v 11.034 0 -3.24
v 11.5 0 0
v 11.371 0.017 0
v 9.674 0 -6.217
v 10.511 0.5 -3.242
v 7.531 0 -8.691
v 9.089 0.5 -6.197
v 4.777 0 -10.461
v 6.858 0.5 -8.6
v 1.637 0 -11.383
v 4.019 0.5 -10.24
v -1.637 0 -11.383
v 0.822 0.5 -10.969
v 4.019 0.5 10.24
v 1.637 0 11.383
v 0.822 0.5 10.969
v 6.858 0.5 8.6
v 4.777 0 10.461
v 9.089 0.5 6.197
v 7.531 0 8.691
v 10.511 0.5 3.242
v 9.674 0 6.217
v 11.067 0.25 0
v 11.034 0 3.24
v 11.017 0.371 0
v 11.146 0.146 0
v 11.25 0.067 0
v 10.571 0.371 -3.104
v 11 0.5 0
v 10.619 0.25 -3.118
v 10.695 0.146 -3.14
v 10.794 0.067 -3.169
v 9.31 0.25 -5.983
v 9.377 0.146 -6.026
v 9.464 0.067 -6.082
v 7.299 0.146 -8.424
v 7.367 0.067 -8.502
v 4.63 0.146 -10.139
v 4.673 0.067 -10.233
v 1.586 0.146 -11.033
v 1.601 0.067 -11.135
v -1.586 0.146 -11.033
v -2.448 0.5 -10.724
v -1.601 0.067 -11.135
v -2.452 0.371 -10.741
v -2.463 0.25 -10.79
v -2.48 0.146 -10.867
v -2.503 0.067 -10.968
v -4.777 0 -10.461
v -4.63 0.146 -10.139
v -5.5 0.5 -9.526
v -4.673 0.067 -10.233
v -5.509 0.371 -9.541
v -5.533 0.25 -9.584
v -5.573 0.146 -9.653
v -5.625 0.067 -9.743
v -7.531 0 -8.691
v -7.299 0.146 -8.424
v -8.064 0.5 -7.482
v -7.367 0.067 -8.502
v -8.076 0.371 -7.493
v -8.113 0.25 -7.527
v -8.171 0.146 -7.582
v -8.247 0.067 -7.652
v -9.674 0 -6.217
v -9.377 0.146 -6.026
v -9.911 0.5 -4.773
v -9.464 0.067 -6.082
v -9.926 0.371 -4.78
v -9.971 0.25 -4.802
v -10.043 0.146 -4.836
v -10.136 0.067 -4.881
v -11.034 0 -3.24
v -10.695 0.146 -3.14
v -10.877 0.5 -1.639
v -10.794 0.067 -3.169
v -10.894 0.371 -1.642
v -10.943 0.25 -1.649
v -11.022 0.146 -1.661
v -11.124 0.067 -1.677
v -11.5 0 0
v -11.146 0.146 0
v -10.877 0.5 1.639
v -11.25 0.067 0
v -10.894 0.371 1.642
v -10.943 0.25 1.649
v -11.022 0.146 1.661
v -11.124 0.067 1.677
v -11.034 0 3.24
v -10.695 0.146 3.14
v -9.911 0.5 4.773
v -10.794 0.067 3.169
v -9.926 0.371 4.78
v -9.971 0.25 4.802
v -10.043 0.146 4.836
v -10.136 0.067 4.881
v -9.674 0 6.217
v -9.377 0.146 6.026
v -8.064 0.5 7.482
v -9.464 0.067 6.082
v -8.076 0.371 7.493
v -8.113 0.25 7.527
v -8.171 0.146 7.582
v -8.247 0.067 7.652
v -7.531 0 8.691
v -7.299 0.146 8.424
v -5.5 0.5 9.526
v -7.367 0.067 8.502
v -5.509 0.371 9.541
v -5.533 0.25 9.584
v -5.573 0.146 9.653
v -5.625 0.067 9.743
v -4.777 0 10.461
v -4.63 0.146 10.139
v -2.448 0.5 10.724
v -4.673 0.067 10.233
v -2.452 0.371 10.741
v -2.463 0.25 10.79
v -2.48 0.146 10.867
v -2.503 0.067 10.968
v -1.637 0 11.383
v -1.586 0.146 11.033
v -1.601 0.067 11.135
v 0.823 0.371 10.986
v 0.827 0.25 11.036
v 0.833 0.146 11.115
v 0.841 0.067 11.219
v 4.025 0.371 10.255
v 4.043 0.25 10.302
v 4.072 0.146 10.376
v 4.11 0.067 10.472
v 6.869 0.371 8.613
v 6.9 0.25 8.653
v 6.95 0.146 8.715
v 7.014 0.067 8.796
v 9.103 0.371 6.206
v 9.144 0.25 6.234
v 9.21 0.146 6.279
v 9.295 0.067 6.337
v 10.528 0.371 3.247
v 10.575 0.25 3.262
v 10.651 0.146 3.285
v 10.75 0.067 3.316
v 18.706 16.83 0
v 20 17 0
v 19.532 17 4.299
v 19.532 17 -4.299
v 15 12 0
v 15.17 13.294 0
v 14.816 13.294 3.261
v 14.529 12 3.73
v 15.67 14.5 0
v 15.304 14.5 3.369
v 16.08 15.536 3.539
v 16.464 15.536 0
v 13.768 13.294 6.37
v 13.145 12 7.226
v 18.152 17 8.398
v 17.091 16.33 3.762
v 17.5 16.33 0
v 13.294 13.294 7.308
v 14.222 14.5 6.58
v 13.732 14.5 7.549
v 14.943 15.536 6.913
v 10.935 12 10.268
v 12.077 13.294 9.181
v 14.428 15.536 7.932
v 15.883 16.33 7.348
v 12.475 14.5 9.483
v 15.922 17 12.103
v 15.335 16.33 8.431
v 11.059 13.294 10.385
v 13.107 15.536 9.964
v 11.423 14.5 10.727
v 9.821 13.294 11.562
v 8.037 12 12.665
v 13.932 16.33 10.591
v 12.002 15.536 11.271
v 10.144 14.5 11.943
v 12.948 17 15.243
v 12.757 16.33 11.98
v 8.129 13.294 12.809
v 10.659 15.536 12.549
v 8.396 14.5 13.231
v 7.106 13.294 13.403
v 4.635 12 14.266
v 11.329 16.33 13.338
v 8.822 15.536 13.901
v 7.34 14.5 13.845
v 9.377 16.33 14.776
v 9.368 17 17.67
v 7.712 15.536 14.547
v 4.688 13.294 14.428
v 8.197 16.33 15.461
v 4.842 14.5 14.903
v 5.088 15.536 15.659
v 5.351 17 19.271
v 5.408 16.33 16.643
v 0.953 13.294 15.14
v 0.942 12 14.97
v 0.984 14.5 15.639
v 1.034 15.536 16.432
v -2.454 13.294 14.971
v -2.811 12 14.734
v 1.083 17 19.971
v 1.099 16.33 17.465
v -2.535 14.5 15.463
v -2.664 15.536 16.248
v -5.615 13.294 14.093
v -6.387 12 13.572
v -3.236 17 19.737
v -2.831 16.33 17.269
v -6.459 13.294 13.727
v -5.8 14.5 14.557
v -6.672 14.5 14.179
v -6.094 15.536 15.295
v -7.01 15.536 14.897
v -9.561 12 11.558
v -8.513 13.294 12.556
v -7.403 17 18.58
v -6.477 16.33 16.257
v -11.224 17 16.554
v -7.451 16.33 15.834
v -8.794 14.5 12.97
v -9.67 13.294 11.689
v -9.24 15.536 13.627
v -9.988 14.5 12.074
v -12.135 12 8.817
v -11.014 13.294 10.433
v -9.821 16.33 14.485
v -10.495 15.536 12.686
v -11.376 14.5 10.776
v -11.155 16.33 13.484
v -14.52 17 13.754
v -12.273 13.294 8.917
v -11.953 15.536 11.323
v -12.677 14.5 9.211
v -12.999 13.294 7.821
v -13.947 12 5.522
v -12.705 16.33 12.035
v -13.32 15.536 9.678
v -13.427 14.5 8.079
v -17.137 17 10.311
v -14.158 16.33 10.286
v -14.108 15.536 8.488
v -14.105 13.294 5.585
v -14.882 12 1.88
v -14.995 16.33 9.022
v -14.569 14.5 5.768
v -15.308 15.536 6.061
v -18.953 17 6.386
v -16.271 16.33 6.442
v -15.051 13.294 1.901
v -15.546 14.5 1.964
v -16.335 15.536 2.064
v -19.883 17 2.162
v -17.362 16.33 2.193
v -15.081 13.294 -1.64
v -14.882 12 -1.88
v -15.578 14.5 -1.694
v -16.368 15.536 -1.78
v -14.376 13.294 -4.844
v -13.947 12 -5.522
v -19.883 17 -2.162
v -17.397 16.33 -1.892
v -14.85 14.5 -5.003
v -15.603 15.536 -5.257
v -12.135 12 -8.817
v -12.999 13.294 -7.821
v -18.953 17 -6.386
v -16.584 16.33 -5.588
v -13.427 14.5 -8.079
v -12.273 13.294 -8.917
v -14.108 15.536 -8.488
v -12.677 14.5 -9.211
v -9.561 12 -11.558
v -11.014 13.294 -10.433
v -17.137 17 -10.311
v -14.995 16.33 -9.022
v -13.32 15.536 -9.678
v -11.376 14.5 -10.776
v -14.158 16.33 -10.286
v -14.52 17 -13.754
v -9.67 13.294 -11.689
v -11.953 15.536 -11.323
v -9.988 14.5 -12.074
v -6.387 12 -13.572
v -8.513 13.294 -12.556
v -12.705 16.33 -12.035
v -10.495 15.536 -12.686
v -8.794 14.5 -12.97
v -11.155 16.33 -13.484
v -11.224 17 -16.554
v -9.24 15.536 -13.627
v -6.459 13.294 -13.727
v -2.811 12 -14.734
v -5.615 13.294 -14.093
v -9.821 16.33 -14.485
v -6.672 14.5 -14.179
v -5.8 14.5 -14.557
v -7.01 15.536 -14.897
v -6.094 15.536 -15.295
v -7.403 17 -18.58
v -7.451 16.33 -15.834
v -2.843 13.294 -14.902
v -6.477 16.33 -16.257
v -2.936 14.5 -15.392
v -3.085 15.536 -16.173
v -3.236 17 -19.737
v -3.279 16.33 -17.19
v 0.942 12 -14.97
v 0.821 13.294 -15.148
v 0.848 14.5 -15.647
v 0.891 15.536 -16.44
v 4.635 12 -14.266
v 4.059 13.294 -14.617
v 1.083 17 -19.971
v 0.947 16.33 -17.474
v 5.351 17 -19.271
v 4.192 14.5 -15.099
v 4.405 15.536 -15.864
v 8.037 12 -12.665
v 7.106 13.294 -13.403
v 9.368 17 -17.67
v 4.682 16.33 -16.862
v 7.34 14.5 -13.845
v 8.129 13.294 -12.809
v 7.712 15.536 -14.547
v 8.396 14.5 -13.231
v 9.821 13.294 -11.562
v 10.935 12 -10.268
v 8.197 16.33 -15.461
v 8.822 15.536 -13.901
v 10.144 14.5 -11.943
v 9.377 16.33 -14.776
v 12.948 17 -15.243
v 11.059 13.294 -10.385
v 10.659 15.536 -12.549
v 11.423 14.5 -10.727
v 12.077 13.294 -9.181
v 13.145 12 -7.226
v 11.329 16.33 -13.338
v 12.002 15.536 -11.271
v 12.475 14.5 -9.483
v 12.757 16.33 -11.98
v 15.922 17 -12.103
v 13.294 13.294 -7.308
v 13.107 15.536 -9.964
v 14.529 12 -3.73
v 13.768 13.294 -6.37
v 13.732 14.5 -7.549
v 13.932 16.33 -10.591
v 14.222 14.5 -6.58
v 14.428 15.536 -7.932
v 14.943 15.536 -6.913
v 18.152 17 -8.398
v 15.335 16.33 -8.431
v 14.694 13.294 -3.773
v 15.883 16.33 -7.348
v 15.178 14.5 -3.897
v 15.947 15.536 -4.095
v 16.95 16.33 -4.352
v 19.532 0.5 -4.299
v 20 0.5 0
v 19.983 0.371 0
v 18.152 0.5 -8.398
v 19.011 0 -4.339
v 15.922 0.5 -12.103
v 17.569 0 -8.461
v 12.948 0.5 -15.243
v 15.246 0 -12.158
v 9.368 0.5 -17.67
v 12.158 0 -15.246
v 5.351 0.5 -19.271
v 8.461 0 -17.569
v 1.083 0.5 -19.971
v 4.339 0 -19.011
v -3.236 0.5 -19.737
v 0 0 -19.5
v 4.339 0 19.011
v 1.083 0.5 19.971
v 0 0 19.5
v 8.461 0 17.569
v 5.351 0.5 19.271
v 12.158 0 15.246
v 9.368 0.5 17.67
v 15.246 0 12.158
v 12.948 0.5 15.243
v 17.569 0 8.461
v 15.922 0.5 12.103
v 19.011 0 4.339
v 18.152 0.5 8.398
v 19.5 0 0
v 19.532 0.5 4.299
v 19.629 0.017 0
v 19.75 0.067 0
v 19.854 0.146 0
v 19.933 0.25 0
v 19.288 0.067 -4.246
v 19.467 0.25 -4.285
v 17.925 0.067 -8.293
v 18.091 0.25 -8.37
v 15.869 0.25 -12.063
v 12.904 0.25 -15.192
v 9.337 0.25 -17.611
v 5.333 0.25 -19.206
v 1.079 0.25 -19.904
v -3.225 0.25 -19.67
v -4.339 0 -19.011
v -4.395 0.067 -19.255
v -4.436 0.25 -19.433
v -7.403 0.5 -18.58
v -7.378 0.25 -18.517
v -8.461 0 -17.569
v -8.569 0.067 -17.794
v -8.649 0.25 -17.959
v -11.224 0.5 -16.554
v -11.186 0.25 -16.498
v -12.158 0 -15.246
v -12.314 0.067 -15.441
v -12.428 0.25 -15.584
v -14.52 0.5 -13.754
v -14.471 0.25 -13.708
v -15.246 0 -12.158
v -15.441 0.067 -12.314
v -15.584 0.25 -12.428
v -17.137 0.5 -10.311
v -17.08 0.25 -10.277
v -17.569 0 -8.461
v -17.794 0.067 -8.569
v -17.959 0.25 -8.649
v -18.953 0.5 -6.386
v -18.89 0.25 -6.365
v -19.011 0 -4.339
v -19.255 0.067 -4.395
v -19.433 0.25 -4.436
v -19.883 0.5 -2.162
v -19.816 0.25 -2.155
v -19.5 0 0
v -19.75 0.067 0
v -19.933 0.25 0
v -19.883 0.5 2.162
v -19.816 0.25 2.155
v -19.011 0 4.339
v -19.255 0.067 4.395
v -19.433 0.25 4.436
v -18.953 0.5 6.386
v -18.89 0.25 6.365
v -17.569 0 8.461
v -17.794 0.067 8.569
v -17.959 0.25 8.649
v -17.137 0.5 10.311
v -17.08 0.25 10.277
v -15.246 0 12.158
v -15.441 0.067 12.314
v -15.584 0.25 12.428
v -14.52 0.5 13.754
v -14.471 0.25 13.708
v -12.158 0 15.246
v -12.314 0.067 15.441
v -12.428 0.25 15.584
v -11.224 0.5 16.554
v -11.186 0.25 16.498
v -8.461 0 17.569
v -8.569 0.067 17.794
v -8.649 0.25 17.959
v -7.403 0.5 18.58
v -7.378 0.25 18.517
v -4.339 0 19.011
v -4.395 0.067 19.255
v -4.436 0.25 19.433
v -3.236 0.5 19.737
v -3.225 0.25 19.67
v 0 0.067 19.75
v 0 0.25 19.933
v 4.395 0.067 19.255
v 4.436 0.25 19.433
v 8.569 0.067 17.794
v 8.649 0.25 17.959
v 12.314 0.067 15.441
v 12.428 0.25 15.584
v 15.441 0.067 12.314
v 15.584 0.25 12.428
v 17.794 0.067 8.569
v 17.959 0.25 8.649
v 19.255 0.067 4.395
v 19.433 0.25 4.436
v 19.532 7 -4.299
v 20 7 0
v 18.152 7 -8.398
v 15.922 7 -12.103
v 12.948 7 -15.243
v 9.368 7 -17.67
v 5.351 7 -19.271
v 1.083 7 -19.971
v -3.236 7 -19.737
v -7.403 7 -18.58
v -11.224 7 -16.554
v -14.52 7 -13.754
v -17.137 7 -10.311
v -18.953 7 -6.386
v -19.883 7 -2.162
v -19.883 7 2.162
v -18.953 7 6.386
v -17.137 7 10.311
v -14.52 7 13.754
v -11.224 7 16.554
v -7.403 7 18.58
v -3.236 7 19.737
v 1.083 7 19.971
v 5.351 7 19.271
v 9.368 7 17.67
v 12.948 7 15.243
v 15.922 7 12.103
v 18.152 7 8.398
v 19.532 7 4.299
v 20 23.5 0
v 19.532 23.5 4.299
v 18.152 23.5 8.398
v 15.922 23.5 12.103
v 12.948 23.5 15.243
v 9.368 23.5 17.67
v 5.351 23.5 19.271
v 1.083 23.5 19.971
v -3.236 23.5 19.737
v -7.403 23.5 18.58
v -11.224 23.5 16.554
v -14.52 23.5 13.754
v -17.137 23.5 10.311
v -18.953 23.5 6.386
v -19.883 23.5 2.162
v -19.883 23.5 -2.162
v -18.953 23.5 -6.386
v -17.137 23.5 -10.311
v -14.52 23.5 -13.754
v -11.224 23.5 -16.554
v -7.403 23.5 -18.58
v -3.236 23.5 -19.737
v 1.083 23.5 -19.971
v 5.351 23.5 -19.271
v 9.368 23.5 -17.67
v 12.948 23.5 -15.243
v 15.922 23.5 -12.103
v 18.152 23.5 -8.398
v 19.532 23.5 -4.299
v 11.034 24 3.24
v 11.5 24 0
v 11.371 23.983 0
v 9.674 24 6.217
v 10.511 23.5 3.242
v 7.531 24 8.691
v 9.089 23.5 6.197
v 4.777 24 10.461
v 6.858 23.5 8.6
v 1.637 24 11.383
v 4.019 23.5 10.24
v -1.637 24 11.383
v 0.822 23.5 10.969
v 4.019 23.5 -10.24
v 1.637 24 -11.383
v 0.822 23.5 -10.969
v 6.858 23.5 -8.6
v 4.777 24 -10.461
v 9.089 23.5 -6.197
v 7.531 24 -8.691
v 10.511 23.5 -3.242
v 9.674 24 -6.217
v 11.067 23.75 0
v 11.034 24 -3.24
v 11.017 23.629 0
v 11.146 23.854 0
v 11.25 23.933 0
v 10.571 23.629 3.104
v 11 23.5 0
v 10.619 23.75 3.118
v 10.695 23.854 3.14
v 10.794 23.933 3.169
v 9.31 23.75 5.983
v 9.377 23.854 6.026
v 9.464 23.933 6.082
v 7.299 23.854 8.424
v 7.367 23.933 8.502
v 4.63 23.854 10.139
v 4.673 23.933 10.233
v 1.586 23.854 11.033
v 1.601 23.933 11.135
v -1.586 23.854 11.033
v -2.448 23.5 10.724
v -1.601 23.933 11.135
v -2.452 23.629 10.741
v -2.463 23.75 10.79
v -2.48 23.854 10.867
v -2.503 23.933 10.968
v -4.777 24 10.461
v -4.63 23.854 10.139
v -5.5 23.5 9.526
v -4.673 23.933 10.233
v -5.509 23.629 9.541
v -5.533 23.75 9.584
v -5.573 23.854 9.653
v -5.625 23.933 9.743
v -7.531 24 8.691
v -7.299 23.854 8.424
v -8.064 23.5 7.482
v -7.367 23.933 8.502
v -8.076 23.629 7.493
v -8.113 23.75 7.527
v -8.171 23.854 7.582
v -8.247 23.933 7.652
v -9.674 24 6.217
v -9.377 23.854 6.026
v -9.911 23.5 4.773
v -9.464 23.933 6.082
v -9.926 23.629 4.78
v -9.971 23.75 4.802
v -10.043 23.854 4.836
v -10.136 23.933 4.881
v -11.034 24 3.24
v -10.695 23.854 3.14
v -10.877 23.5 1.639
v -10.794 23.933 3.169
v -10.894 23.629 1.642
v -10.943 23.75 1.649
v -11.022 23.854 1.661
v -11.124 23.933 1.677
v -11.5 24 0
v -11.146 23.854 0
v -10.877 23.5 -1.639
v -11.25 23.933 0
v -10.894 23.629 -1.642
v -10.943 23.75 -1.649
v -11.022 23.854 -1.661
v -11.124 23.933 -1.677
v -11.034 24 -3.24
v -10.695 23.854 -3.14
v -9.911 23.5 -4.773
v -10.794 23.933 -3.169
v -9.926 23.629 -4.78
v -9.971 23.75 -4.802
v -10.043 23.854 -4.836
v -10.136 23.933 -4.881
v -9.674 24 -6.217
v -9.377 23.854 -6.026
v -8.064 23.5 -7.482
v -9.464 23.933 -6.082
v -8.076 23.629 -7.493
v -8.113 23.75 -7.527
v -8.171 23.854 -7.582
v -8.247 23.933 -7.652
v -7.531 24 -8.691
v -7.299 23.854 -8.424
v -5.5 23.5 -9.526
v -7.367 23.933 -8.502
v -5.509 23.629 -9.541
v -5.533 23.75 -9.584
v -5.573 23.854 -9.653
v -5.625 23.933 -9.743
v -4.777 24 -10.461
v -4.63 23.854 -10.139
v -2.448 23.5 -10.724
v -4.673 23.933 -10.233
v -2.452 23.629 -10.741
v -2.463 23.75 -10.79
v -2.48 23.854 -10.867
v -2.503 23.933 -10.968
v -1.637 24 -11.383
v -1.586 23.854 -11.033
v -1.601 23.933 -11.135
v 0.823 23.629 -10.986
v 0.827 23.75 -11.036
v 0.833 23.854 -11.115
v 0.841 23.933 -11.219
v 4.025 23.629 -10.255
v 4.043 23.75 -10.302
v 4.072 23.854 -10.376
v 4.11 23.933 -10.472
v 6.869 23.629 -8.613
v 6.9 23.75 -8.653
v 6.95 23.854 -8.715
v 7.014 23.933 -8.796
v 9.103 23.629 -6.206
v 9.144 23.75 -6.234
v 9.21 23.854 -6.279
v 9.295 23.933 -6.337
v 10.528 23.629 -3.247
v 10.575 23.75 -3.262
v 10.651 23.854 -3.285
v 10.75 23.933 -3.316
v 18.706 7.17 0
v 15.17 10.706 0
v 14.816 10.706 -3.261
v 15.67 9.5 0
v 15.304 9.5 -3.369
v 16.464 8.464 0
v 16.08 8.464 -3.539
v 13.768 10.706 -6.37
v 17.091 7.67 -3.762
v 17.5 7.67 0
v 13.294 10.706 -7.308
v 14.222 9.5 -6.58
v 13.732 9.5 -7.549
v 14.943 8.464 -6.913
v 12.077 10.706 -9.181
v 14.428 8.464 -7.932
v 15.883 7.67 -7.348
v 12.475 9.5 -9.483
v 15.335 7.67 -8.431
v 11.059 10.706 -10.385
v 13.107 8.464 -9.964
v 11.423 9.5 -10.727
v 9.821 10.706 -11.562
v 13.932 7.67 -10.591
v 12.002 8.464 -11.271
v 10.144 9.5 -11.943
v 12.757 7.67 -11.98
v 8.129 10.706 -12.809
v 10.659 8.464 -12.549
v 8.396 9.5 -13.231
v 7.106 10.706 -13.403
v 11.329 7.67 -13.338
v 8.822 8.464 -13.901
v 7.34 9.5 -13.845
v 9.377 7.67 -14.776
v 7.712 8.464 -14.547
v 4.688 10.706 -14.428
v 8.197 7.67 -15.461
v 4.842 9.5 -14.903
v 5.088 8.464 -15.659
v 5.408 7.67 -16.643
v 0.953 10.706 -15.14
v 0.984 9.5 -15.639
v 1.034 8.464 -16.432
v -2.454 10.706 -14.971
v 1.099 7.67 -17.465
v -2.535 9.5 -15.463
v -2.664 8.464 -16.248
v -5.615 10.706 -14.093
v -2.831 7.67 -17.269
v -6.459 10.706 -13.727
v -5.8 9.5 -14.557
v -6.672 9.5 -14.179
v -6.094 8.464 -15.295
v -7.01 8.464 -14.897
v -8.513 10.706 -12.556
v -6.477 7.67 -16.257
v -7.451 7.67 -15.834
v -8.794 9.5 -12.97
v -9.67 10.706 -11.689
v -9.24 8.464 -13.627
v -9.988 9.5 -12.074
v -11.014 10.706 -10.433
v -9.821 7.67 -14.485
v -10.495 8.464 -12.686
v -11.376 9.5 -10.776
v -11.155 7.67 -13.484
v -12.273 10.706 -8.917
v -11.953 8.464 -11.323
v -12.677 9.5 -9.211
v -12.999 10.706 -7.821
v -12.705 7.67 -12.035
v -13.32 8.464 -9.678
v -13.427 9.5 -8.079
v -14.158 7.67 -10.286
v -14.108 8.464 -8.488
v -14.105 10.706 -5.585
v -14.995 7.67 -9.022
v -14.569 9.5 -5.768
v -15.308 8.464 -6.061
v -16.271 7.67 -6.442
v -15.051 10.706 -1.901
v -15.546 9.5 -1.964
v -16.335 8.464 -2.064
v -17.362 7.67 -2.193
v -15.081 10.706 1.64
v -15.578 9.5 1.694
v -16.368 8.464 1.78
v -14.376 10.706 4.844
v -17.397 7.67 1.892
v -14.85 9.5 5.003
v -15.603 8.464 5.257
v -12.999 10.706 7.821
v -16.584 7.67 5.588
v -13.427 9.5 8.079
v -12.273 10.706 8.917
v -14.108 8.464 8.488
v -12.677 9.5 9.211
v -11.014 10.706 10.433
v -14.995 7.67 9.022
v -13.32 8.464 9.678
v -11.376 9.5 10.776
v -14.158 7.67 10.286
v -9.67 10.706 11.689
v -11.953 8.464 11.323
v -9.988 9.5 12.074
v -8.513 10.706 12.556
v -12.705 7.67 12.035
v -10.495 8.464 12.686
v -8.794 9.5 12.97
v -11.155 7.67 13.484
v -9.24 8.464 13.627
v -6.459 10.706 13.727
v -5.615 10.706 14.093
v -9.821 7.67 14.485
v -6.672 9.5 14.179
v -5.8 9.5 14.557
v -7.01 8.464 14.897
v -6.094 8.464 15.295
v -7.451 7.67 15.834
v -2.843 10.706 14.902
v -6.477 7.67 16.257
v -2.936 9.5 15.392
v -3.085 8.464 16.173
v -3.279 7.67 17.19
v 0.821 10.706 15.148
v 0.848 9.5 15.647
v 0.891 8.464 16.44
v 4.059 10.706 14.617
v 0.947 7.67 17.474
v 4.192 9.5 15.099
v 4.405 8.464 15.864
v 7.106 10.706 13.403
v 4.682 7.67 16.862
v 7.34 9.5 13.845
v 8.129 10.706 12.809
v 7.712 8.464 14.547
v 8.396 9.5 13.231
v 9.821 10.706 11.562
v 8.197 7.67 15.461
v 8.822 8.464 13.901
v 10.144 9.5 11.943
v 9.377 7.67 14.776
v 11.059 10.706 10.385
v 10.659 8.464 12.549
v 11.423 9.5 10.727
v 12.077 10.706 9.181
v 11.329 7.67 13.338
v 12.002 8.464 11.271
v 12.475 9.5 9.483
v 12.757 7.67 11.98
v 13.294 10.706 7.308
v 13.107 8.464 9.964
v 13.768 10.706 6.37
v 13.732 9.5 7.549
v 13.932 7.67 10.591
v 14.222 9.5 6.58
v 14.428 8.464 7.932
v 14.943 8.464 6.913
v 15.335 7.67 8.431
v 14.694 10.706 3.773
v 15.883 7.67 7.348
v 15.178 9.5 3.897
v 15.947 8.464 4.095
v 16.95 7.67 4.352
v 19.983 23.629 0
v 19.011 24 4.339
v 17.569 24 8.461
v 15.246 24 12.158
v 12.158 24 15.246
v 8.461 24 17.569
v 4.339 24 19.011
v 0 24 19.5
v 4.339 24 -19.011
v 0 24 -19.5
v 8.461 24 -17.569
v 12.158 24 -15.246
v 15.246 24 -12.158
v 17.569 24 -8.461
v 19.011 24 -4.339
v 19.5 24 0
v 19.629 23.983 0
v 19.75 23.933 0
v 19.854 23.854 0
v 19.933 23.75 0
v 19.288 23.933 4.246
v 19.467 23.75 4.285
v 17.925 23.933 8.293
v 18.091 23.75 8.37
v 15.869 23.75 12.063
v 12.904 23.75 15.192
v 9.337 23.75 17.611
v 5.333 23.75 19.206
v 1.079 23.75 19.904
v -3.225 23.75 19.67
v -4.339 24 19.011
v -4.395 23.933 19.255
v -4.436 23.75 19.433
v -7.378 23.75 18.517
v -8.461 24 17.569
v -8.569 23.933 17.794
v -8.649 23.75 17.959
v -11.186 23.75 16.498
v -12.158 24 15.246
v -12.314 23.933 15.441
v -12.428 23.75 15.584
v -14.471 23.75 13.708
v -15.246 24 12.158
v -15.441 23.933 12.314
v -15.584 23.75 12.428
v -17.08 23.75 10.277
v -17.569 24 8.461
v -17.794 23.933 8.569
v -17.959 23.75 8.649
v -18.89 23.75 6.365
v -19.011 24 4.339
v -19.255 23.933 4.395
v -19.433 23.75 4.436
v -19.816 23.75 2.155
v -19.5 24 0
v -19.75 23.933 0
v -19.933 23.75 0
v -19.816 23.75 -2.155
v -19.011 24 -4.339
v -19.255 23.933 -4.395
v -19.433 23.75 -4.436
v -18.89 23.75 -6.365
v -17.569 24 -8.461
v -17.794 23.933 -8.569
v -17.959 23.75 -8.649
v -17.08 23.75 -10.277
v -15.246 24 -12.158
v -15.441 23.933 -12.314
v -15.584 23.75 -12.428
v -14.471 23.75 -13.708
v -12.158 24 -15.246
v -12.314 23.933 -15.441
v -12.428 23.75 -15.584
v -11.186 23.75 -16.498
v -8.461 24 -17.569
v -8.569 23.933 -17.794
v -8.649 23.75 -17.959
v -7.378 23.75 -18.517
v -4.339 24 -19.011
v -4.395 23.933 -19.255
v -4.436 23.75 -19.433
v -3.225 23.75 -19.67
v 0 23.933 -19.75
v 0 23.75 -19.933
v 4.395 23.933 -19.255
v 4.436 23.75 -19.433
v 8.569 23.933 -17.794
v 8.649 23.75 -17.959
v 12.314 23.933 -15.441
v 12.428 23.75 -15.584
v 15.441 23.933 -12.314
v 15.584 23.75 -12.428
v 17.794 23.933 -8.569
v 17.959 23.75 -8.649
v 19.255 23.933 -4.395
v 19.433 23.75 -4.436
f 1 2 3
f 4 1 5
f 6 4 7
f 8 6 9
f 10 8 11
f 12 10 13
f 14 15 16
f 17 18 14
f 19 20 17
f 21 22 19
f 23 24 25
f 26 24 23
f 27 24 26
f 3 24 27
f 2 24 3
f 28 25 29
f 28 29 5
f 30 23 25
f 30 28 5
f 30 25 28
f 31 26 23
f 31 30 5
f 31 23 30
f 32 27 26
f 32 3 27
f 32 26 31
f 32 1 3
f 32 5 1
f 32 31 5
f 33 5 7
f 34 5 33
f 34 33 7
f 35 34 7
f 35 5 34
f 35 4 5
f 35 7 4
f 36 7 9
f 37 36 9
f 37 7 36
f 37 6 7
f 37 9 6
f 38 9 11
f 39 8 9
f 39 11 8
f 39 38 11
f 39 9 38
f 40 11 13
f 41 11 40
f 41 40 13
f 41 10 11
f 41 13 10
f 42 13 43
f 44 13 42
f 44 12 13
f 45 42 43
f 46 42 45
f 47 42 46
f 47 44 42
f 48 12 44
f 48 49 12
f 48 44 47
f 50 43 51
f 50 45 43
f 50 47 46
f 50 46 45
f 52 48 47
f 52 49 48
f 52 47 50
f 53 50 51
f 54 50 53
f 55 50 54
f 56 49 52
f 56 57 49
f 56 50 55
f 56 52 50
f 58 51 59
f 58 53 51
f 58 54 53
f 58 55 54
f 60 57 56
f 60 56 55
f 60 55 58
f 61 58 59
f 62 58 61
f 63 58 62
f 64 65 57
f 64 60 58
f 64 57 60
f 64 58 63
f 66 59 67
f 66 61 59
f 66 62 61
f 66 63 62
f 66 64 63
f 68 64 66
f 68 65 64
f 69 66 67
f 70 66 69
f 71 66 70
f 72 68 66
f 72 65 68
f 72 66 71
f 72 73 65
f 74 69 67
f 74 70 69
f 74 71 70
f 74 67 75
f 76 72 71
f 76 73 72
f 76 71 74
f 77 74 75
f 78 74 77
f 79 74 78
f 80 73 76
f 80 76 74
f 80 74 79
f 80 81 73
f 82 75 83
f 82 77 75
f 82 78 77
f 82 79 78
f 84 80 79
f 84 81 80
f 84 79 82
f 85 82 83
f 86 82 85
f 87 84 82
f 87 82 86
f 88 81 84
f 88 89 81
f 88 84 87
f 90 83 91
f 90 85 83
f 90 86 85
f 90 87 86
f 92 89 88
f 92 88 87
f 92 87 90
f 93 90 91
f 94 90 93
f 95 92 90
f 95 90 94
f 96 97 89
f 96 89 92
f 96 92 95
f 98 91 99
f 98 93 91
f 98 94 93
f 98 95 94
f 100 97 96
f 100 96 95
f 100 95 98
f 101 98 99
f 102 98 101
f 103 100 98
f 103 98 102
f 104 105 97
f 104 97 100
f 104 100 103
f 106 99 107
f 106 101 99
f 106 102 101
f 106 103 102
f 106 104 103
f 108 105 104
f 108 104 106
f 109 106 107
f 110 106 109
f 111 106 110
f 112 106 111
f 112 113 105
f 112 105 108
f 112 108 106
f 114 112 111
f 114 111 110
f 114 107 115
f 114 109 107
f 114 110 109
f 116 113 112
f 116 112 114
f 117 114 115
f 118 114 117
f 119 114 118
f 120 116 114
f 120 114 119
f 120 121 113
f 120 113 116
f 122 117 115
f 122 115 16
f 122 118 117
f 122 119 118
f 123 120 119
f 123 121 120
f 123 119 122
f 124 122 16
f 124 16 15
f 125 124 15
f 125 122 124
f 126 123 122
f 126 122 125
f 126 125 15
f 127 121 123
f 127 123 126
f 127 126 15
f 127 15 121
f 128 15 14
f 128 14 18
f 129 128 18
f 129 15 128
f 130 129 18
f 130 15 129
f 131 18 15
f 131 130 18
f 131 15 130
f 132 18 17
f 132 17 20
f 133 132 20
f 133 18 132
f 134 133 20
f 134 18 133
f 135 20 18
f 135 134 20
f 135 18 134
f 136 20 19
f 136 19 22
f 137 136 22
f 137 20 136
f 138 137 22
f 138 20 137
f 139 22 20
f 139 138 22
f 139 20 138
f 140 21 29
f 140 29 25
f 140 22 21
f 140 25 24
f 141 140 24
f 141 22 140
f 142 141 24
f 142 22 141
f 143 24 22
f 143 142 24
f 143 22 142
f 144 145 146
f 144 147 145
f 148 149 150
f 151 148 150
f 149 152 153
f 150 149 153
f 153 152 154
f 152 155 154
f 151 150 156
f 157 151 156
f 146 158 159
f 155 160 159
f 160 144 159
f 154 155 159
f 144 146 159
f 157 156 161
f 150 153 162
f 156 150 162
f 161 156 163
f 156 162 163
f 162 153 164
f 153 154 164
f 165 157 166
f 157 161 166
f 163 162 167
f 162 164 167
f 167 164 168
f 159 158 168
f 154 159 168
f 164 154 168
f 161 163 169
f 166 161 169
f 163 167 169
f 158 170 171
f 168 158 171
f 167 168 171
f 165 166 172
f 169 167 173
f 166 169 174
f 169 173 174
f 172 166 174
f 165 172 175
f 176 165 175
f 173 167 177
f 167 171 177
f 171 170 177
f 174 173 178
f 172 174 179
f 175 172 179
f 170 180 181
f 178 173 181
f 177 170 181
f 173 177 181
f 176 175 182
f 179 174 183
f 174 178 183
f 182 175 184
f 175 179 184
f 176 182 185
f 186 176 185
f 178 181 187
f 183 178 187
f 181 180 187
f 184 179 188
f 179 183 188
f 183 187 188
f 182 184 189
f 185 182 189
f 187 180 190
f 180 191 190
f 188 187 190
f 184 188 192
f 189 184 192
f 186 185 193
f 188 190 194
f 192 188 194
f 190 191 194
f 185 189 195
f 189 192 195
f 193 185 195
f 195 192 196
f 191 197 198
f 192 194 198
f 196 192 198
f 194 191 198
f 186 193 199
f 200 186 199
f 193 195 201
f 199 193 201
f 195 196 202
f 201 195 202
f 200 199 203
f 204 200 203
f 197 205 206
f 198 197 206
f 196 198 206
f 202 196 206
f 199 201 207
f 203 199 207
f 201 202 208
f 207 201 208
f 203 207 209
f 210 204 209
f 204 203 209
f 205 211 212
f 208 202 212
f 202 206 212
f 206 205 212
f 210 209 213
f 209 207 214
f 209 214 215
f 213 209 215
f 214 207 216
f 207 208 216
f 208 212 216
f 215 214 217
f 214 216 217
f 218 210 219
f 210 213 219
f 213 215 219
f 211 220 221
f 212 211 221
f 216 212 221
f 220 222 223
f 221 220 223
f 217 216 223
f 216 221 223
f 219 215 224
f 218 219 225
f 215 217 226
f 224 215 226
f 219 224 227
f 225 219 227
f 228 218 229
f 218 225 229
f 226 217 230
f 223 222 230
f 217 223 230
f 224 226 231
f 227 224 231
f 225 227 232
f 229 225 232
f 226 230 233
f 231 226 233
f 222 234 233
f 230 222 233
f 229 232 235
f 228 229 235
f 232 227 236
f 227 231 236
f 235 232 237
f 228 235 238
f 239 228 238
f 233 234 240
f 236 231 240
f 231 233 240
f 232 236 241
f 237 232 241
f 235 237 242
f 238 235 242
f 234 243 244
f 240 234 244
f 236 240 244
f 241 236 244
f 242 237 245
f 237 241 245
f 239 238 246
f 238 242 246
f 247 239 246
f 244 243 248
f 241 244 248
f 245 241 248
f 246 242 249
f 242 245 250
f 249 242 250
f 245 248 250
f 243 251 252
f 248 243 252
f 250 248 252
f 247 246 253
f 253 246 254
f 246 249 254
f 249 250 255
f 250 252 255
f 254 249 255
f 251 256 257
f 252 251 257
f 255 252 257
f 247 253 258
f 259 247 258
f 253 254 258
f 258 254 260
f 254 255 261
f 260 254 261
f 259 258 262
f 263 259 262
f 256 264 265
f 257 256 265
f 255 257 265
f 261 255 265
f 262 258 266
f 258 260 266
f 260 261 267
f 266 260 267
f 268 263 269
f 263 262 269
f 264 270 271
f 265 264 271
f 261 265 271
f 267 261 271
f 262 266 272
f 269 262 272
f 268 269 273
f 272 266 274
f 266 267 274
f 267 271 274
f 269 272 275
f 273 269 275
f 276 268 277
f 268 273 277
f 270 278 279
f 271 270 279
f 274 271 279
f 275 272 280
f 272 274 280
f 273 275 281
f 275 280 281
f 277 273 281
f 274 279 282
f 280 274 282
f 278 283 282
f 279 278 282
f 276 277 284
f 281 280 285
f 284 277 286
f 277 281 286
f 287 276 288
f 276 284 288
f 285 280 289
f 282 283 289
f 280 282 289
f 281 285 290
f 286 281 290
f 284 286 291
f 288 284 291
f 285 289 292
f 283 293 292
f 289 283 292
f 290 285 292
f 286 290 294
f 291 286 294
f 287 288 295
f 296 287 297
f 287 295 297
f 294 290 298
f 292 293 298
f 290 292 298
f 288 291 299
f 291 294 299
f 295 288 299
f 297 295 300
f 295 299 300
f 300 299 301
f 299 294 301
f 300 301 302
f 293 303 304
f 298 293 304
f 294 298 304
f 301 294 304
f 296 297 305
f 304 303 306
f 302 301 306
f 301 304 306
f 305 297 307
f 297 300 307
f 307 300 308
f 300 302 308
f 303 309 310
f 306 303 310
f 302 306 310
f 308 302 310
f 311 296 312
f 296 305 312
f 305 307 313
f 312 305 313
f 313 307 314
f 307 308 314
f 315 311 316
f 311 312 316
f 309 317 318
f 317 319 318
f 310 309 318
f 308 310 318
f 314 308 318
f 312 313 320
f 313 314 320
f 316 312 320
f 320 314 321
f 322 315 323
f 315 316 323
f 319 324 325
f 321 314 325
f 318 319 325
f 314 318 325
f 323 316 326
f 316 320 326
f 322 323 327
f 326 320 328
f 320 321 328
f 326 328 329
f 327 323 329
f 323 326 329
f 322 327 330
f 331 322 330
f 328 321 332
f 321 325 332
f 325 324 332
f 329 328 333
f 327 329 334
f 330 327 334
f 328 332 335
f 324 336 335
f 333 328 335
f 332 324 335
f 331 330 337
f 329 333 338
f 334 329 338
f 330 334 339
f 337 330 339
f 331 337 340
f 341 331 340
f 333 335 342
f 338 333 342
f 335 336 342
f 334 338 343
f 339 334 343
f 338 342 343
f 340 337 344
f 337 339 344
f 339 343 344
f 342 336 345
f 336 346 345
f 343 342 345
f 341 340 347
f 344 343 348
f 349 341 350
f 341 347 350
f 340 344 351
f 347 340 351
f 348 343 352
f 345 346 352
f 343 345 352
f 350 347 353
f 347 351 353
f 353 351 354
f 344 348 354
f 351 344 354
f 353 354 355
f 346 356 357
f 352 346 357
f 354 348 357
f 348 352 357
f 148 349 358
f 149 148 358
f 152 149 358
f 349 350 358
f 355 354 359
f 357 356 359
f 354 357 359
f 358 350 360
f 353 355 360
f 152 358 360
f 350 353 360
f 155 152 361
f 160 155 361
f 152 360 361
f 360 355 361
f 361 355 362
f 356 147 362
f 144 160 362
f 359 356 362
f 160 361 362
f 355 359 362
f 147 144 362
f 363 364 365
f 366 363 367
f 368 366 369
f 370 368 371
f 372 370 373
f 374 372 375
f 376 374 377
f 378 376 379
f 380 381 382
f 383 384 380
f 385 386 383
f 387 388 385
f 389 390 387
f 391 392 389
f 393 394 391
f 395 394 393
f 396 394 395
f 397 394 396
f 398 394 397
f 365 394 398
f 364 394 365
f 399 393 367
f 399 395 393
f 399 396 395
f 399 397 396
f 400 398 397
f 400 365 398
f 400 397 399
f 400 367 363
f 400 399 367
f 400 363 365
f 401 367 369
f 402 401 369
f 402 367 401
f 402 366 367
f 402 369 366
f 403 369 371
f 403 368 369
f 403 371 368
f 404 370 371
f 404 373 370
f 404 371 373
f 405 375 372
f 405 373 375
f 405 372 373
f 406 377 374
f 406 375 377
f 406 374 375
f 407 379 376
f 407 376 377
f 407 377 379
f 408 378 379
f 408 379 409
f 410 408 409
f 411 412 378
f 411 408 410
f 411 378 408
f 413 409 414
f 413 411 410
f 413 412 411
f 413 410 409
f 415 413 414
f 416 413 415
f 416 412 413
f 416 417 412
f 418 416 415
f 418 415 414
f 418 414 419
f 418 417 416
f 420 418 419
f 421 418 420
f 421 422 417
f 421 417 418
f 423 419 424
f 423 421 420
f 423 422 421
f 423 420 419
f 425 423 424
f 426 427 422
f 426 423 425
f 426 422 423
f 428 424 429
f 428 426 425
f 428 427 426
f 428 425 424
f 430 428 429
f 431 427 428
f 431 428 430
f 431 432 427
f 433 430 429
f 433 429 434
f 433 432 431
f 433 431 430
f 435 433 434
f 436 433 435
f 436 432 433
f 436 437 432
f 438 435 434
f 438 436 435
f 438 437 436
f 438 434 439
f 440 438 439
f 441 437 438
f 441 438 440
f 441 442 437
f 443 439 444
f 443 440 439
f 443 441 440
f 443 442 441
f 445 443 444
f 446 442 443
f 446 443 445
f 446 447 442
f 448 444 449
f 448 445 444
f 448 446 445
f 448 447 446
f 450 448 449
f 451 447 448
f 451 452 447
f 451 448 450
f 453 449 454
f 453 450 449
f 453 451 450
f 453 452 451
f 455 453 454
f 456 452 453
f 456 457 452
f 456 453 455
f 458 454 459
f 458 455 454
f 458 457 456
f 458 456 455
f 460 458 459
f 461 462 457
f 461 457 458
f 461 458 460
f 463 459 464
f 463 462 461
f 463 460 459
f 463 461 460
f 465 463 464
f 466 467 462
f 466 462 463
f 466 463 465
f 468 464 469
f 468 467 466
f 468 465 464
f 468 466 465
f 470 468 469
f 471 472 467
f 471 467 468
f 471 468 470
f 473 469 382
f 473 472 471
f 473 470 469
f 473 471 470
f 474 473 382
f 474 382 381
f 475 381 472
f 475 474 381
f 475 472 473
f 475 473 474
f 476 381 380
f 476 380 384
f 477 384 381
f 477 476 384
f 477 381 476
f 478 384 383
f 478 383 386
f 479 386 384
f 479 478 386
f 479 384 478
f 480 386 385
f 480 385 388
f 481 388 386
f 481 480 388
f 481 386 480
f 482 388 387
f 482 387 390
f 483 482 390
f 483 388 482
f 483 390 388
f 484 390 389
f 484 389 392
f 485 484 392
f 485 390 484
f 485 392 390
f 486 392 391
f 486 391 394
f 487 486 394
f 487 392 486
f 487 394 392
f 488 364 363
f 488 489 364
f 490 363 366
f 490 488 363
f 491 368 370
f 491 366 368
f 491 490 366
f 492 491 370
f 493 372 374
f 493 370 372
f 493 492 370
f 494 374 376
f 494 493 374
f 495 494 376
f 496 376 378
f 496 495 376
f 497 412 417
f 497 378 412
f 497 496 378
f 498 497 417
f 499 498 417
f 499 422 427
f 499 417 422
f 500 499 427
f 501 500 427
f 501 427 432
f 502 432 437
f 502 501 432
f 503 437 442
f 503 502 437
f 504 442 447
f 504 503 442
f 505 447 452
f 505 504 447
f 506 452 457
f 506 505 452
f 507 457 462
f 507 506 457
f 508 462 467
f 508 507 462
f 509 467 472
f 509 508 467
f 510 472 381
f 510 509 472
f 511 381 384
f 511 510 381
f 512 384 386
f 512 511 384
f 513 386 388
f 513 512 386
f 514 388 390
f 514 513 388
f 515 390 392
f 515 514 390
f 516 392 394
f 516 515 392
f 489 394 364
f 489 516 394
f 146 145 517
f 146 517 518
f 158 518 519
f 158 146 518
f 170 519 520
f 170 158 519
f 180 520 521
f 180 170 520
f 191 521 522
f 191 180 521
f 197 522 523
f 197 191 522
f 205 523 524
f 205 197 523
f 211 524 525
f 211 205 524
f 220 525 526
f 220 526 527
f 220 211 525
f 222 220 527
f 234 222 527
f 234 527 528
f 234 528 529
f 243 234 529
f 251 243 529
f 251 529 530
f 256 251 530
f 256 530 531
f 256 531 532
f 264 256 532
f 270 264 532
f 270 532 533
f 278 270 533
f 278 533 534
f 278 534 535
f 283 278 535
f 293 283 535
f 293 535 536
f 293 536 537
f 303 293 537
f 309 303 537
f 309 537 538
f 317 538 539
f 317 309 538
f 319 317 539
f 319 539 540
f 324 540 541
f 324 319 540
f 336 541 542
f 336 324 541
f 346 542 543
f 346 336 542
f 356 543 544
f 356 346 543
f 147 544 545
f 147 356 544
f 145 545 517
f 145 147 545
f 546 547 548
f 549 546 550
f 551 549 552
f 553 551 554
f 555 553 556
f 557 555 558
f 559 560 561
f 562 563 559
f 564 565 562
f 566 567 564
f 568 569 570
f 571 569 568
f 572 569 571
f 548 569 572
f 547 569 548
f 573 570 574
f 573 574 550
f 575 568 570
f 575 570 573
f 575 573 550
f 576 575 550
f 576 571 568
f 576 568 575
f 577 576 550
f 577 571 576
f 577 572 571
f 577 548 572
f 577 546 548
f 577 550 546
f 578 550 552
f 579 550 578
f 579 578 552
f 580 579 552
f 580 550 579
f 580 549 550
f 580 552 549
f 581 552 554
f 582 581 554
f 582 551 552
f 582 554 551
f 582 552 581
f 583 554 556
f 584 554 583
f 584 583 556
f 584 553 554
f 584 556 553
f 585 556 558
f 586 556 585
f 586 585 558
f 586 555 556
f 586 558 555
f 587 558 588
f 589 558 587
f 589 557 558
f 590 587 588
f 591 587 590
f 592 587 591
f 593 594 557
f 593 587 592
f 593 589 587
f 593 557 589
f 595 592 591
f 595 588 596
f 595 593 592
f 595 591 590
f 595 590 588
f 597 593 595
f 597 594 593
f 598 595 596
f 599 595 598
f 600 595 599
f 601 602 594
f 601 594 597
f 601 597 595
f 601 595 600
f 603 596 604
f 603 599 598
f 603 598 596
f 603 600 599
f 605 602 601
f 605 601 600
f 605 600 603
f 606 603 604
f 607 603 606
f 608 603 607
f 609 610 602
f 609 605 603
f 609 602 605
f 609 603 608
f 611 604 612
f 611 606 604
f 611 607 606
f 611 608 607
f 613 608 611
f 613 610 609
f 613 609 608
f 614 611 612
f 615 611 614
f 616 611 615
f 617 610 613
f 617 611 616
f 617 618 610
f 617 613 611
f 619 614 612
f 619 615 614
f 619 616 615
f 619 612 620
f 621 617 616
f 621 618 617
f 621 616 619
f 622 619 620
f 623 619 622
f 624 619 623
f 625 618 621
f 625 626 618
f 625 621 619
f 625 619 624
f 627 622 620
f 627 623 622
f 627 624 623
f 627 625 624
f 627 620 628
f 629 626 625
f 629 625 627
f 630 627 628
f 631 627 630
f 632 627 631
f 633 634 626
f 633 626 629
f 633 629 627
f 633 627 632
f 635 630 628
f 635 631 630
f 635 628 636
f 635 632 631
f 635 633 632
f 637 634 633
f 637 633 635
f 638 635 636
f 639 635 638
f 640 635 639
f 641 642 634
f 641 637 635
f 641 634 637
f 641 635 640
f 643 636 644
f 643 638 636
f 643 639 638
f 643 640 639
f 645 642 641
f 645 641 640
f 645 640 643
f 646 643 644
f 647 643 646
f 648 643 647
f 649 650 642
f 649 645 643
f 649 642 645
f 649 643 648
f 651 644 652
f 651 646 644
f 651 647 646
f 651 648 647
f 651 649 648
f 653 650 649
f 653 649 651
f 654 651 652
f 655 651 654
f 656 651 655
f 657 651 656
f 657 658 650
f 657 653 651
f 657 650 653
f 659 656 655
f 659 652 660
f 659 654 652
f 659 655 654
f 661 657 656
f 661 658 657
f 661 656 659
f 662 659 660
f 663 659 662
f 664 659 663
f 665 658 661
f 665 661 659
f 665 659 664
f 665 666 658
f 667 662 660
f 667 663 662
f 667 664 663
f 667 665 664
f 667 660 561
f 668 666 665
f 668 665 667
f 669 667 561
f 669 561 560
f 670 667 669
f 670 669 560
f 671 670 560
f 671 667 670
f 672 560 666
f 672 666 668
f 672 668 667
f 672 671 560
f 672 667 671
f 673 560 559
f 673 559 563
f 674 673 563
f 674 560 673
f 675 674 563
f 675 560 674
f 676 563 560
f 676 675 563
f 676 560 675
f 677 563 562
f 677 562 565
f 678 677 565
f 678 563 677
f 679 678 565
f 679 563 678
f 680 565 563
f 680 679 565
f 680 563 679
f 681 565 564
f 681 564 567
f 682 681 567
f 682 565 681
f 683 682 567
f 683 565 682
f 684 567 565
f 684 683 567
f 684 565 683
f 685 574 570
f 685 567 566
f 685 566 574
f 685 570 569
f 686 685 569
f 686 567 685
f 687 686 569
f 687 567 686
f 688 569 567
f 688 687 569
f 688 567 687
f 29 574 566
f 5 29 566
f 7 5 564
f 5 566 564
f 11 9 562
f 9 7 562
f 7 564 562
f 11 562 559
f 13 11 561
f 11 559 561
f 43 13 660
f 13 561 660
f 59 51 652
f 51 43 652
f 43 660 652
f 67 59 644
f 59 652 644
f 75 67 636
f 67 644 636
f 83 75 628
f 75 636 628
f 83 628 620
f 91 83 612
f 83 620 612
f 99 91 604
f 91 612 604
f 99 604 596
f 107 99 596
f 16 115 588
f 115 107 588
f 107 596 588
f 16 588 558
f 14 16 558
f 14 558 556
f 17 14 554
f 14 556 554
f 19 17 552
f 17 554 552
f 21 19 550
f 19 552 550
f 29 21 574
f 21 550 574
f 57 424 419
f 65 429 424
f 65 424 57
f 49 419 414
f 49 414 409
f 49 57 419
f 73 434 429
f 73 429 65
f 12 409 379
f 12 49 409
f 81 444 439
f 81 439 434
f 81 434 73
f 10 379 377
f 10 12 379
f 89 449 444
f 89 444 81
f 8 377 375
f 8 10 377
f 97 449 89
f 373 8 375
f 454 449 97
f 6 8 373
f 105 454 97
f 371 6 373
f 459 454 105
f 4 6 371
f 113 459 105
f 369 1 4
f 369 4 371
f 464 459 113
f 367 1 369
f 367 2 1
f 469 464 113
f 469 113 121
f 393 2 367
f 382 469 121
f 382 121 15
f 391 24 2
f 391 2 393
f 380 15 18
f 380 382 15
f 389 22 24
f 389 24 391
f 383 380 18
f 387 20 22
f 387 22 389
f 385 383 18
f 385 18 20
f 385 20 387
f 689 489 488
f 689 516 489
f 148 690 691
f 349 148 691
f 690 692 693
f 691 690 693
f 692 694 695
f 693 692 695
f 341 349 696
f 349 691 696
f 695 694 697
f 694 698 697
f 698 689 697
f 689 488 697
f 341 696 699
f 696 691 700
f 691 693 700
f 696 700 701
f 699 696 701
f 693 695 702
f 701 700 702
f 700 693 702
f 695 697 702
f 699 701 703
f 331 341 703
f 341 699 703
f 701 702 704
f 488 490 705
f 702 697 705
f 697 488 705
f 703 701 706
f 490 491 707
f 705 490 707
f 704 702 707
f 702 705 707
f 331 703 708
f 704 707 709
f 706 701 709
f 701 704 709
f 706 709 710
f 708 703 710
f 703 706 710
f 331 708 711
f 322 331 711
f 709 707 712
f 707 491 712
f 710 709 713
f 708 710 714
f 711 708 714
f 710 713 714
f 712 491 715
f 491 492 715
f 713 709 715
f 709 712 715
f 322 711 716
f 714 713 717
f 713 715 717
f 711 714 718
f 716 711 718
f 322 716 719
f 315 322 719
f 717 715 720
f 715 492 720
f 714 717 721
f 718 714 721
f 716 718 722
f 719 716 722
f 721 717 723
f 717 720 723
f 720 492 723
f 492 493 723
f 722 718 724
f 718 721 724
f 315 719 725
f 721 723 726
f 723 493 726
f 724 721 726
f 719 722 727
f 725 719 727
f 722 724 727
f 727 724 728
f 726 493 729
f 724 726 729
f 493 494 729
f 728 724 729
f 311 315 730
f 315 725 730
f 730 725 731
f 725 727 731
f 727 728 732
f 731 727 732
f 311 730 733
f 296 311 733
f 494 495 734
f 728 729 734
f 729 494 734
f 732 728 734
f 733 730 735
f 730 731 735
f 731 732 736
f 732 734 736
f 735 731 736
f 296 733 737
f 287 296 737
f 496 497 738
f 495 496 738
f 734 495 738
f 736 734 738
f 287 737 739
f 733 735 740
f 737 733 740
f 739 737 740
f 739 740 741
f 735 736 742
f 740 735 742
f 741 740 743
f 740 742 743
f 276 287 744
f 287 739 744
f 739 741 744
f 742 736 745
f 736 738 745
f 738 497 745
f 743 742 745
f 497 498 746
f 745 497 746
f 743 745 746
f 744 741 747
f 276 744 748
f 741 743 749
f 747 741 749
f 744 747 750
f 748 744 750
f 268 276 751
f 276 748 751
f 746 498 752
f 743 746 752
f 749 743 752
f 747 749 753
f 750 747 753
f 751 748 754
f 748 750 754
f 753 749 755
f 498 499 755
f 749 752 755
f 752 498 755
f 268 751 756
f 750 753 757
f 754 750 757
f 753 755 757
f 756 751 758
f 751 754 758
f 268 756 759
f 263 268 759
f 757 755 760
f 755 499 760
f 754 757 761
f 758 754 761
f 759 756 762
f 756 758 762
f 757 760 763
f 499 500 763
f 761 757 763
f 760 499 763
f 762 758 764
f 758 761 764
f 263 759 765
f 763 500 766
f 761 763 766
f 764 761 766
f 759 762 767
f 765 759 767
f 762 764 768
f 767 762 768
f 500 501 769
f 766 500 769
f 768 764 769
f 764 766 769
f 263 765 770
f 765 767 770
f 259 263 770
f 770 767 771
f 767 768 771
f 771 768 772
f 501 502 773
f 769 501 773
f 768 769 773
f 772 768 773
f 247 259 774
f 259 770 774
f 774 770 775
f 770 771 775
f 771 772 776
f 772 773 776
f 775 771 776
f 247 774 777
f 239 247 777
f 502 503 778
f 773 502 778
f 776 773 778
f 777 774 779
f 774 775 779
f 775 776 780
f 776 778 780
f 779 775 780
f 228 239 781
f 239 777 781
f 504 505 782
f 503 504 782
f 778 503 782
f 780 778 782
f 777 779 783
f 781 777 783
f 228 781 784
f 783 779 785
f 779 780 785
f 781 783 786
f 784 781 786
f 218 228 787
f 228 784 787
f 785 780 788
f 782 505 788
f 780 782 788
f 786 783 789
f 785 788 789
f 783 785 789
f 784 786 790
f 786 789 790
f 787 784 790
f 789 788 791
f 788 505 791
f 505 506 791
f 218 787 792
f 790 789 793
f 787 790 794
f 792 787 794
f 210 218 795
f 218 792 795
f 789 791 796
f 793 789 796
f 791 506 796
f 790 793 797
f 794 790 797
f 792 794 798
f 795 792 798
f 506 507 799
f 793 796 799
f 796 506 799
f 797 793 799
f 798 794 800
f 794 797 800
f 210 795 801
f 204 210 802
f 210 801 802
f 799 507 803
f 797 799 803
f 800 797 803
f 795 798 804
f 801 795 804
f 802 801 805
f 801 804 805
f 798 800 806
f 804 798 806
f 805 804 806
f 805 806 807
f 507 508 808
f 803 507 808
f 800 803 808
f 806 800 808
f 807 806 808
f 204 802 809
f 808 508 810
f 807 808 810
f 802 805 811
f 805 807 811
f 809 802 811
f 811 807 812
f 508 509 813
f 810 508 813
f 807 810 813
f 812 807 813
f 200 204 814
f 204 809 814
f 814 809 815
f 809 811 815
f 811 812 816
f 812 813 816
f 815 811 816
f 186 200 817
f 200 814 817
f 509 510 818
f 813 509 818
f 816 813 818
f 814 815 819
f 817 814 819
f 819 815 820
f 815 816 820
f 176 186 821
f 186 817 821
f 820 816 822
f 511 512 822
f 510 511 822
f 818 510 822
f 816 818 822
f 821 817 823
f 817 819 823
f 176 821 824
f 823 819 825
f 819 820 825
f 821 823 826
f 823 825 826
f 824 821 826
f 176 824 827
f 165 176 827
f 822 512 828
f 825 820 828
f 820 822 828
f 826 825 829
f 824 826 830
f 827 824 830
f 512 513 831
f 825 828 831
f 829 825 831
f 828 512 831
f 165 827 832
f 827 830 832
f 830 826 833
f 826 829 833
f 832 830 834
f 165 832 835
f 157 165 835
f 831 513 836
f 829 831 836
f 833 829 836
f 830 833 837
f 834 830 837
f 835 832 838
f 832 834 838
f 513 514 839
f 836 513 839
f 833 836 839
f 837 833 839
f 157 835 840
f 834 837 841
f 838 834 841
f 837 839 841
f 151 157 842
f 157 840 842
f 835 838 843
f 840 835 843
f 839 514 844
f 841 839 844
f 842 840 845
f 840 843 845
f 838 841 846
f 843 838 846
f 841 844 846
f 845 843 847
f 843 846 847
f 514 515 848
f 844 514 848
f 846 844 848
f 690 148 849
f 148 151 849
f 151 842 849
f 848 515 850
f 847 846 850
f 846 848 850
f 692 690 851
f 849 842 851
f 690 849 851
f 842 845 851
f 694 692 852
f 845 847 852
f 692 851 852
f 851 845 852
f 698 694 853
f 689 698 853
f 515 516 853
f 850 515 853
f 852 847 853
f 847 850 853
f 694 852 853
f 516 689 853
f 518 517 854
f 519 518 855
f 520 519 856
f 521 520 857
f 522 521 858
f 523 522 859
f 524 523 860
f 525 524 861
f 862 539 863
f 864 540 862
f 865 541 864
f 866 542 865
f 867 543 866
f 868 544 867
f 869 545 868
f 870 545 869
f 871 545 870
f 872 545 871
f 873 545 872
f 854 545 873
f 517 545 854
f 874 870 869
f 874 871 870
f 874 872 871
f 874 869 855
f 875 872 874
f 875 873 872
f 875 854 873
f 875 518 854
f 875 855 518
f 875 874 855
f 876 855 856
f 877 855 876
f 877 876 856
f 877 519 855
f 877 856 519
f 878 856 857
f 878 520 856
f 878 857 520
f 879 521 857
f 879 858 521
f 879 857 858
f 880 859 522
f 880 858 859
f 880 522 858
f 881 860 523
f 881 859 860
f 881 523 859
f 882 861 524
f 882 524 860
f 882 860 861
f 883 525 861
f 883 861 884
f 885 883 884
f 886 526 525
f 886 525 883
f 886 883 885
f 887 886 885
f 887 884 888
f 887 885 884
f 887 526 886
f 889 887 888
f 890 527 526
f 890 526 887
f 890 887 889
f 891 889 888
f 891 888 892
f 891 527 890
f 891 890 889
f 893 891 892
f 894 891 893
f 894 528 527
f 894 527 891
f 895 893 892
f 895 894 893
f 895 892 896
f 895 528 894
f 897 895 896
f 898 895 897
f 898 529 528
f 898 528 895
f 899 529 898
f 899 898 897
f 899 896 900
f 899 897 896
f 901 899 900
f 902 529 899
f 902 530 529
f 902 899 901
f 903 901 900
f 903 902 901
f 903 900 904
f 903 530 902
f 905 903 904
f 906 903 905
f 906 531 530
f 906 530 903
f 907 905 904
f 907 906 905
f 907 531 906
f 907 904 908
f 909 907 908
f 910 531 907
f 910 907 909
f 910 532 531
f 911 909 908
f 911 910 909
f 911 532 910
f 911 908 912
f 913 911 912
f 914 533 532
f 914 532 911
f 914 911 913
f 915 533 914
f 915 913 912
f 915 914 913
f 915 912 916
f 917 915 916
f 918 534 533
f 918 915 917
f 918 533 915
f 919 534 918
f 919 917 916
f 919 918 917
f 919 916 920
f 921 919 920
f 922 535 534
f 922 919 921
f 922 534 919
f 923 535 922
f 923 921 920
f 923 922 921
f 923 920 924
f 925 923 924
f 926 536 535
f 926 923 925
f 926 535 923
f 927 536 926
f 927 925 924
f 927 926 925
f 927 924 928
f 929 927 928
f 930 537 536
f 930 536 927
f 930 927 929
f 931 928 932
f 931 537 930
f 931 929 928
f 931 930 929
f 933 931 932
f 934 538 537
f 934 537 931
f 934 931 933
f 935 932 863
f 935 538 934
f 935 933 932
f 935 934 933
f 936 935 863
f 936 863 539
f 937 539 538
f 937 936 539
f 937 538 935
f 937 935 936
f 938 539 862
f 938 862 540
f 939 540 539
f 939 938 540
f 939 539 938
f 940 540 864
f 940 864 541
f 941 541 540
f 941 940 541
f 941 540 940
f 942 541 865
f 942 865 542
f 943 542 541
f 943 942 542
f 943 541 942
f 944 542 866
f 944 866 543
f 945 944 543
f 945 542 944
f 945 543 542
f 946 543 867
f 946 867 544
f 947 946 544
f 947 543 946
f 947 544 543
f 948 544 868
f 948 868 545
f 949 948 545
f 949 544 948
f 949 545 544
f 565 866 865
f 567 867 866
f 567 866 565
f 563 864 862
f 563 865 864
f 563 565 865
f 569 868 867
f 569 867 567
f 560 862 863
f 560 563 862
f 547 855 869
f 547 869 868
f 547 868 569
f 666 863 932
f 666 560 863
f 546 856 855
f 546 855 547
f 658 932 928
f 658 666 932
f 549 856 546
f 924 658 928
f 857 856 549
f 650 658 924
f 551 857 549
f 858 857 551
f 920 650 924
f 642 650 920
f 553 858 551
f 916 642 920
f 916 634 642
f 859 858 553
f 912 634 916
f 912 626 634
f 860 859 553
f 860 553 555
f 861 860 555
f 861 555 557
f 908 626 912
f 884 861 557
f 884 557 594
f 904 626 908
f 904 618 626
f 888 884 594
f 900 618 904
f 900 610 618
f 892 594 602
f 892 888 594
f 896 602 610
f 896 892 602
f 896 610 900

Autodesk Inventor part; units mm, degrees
ref_plane "YZ Plane" through (0, 0, 0) normal (1, 0, 0) x (0, 1, 0)
ref_plane "XZ Plane" through (0, 0, 0) normal (0, 1, 0) x (-1, 0, 0)
ref_plane "XY Plane" through (0, 0, 0) normal (0, 0, 1) x (1, 0, 0)
sketch "Sketch1" plane through (0, 0, 0) normal (0, 0, 1) x (1, 0, 0)
  line L0 (0, 0) -> (20, 0)
  line L1 (20, 0) -> (20, 12)
  line L2 (20, 12) -> (0, 12)
  line L3 (0, 12) -> (0, 0)
  line L4 (0, 0) -> (11, 0)
  line L5 (11, 0) -> (11, 12)
  line L6 (11, 12) -> (0, 12)
  line L7 (0, 12) -> (0, 0)
  line L8 (20, 12) -> (20, 12)
  arc A0 (15, 12) -> (23.1054, 8.0813) centre (20, 12) ccw
  point P0 (20, 7)
  dimension "d0" = 20
  dimension "d1" = 12
  dimension "d2" = 11
  dimension "d3" = 0
  dimension "d4" = 5
revolve "Revolution1" add sketch "Sketch1" angle 360 about axis through (0, 12, 0) along (0, -1, 0) contours L5 L2 A0 L1 L0
mirror "Mirror1" about plane through (15, 12, 0) normal (0, 1, 0) of "Revolution1"
fillet "Fillet1" radius 0.5 4 edges at (-20, 0, 0) (-11, 0, 0) (-20, 24, 0) (-11, 24, 0)
properties part number "DriveWheelHalf"
